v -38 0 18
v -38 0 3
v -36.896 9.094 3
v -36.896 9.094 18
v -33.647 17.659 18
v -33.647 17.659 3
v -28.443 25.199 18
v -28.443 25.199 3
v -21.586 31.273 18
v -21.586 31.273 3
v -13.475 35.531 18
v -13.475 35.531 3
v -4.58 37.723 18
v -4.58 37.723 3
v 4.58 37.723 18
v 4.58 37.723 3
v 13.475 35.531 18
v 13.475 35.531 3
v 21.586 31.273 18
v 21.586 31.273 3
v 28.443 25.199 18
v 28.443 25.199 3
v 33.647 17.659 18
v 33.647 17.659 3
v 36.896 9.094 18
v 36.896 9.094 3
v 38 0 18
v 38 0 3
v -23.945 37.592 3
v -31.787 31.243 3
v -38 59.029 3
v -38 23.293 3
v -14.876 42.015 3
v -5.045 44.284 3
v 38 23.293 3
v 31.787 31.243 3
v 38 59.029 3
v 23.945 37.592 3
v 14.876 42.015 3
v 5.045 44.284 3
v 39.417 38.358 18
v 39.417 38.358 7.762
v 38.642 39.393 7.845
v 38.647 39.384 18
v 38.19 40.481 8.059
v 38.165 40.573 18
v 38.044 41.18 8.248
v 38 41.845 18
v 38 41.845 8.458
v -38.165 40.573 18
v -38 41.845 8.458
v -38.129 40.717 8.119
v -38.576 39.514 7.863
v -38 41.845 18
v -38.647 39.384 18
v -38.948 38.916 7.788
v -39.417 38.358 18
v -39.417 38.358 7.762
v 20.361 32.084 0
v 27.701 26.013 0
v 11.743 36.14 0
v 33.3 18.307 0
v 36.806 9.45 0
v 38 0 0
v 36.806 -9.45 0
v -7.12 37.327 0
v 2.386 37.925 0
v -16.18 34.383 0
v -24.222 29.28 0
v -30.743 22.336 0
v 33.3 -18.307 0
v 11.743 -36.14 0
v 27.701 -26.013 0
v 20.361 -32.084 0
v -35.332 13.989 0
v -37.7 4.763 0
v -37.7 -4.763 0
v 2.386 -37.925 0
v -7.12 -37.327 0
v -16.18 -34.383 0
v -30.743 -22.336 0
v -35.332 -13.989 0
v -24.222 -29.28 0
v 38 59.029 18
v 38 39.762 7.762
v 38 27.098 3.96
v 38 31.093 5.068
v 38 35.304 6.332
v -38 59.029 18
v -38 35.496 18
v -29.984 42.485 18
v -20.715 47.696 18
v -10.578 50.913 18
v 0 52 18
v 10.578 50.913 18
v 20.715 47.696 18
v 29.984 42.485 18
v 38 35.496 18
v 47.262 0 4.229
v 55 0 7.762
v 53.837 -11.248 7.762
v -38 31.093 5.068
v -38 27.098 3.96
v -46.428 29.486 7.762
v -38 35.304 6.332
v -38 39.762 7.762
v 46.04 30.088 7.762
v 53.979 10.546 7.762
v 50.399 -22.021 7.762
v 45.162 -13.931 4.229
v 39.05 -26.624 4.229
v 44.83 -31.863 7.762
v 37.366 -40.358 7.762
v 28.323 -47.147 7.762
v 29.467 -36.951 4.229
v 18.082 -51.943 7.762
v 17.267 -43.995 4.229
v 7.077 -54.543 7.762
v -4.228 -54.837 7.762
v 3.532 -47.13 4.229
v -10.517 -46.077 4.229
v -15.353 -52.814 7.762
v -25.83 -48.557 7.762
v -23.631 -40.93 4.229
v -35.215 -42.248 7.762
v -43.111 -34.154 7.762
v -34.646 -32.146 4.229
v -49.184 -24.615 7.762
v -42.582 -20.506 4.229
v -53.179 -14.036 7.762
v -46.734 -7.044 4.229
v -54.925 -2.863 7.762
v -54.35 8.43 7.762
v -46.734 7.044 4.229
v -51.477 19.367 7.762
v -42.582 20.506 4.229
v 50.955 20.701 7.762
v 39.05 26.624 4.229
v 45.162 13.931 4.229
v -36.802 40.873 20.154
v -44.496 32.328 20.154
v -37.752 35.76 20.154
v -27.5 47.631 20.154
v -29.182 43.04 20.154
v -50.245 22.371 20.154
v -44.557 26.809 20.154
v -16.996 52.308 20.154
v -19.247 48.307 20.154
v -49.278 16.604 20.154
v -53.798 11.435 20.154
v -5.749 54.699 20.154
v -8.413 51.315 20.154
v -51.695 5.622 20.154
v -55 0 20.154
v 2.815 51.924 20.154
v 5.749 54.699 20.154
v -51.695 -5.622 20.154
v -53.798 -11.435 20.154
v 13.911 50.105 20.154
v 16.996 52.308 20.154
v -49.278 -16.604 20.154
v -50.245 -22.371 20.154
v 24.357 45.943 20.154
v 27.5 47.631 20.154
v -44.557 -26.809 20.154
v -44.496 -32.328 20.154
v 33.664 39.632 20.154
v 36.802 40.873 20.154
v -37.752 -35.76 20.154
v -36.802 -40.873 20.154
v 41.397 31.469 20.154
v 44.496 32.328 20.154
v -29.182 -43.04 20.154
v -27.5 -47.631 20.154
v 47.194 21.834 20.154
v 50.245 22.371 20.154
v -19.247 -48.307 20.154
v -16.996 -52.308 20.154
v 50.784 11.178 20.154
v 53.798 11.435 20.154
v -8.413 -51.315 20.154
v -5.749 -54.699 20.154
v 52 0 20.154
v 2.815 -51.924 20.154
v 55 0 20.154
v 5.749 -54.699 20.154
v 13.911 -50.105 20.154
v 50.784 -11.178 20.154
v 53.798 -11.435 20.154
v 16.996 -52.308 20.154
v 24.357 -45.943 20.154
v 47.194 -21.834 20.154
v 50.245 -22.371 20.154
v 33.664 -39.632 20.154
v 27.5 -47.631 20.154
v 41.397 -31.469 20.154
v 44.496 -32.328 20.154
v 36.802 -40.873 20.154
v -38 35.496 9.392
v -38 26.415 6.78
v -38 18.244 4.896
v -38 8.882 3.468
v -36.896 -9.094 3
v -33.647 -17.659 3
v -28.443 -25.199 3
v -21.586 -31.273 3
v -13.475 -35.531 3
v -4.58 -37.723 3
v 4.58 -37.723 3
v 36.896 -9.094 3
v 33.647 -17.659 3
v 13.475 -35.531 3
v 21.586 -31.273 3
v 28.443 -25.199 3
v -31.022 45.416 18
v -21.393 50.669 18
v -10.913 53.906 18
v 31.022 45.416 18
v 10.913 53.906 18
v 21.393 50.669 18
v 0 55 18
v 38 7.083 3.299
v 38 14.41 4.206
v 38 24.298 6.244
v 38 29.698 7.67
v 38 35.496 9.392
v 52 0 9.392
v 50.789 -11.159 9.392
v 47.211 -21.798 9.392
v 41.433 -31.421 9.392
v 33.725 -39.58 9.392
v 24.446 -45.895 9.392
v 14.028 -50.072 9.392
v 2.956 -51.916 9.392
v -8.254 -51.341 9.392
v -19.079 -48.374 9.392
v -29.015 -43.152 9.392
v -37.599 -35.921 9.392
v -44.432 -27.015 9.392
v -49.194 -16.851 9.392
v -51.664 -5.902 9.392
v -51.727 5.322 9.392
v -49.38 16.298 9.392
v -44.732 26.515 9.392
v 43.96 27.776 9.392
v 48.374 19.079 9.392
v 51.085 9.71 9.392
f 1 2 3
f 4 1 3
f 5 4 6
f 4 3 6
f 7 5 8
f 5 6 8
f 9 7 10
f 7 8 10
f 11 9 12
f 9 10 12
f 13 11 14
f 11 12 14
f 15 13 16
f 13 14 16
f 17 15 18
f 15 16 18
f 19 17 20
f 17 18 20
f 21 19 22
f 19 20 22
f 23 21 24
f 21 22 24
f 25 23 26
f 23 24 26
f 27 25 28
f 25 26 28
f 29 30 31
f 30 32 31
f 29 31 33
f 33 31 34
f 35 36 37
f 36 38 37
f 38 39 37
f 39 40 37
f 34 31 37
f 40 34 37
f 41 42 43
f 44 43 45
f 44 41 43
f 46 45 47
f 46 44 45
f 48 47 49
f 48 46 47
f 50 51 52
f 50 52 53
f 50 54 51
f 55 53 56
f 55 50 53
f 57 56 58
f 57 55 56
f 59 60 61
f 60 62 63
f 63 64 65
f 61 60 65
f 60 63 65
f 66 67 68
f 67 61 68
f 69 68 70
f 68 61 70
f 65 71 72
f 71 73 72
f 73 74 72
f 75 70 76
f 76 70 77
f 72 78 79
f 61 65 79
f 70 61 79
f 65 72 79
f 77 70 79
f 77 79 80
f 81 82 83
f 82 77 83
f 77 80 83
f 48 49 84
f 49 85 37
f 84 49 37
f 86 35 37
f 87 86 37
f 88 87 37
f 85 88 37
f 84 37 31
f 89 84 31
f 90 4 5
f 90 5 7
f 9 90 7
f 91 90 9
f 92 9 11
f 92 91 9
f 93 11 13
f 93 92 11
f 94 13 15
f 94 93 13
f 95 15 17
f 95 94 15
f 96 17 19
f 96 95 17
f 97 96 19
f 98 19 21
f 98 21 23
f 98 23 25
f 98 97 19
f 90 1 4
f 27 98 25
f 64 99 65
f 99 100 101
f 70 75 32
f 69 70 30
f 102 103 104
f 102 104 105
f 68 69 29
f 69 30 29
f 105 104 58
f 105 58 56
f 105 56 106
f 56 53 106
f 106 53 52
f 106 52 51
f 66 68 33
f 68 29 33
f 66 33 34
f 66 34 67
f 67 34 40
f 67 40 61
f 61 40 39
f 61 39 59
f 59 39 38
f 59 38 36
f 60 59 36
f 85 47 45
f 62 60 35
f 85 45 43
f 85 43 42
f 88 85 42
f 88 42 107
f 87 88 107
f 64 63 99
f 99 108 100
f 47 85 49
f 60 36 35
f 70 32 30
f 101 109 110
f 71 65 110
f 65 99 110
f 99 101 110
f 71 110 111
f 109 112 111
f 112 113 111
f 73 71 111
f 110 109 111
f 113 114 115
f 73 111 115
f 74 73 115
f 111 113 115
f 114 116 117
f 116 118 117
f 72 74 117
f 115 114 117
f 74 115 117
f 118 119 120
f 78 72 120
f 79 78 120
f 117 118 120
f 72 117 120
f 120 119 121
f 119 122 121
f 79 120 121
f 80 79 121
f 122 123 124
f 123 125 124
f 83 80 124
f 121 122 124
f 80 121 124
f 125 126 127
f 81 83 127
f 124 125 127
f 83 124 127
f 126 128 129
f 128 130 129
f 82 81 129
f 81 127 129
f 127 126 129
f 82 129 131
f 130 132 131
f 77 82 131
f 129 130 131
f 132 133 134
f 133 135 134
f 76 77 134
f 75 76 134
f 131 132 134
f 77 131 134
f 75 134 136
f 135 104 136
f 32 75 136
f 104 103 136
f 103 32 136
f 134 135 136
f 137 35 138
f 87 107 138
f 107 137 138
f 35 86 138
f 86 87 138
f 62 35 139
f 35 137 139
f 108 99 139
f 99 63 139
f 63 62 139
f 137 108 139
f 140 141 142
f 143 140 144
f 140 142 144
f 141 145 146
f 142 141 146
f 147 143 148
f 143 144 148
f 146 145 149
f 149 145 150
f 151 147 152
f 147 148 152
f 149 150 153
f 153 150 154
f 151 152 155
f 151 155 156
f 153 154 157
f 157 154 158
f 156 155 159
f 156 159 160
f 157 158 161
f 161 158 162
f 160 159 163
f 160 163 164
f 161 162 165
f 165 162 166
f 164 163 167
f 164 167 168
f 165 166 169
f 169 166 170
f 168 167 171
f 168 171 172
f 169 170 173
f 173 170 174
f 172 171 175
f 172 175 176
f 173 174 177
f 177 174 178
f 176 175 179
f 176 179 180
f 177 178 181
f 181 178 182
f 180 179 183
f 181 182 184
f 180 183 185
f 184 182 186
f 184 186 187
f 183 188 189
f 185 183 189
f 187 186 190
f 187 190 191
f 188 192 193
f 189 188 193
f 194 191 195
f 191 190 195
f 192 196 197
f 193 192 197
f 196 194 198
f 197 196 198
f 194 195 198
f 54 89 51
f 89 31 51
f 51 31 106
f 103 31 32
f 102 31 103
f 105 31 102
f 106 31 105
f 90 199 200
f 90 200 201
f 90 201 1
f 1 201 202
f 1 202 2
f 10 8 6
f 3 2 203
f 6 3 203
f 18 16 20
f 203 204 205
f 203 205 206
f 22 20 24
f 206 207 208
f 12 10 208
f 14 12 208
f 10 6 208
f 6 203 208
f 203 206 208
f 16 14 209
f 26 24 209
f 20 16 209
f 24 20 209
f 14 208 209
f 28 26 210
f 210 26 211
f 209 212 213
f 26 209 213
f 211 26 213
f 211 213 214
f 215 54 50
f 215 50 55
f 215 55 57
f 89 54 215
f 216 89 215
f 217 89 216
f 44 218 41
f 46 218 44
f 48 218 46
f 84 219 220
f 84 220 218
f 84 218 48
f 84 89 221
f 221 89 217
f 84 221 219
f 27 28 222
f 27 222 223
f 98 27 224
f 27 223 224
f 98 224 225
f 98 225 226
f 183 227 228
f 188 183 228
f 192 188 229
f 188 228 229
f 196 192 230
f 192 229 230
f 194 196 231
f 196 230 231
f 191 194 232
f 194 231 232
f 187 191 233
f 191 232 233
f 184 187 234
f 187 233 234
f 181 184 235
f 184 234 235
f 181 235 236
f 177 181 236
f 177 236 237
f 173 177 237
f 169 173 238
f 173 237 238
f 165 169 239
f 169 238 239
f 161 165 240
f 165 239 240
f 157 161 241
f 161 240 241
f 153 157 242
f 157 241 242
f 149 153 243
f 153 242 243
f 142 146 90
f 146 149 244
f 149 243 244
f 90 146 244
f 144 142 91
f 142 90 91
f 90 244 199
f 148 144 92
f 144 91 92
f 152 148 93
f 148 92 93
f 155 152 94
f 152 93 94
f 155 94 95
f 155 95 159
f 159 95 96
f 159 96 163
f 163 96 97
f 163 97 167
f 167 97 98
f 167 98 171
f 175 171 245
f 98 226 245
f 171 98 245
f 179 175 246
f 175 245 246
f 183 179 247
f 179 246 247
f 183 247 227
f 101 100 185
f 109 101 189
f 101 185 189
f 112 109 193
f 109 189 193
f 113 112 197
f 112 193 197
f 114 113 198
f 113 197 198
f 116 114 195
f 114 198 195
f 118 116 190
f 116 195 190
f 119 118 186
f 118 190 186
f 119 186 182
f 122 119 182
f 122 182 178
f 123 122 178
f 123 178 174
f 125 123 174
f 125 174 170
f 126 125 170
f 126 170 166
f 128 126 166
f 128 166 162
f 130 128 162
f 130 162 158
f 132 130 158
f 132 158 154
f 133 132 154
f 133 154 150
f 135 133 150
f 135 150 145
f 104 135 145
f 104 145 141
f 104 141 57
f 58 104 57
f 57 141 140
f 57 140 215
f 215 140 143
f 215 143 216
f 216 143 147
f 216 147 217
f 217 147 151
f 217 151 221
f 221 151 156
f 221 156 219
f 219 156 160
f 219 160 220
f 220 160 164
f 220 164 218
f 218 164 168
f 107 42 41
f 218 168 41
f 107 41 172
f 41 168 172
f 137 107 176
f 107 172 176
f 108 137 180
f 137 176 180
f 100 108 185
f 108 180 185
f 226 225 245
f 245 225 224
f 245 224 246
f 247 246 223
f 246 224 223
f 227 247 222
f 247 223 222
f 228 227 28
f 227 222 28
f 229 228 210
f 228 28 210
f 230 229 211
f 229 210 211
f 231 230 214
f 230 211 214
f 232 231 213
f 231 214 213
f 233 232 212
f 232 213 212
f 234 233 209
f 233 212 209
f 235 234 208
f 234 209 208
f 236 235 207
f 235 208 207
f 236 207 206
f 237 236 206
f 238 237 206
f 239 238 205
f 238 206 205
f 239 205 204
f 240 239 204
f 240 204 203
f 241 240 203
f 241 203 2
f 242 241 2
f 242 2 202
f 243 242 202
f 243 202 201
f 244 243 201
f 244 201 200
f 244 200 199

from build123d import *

# Parameters (mm, degrees)
F3_DEPTH = 15
F4_R     = 5


with BuildPart() as f1:
    # F0 (on Front) → F1 (revolve)
    with BuildSketch(Plane.XZ):
        Polygon((0, 3), (0, 0), (38, 0), (55, 7.7617389267), (55, 20.1544902792), (52, 20.1544902792), (52, 9.3920202926), (38, 3), align=None)
    revolve(axis=Axis((0, 0, 1.5), (0, 0, -1)))

    # F2 (on face) → F3 (join)
    with BuildSketch(Plane.XY.offset(3)):
        with BuildLine():
            Line((-38, 59.0290650725), (-38, 0))
            ThreePointArc((-38, 0), (0, 38), (38, 0))
            Line((38, 0), (38, 59.0290650725))
            Line((38, 59.0290650725), (-38, 59.0290650725))
        make_face()
    extrude(amount=F3_DEPTH)

    # F4
    f4_edges = [f1.edges().sort_by_distance(p)[0] for p in [
        (38, 39.761791, 12.880869),
        (-38, 39.761791, 12.880869),
    ]]
    fillet(f4_edges, radius=F4_R)


solid = f1.part
